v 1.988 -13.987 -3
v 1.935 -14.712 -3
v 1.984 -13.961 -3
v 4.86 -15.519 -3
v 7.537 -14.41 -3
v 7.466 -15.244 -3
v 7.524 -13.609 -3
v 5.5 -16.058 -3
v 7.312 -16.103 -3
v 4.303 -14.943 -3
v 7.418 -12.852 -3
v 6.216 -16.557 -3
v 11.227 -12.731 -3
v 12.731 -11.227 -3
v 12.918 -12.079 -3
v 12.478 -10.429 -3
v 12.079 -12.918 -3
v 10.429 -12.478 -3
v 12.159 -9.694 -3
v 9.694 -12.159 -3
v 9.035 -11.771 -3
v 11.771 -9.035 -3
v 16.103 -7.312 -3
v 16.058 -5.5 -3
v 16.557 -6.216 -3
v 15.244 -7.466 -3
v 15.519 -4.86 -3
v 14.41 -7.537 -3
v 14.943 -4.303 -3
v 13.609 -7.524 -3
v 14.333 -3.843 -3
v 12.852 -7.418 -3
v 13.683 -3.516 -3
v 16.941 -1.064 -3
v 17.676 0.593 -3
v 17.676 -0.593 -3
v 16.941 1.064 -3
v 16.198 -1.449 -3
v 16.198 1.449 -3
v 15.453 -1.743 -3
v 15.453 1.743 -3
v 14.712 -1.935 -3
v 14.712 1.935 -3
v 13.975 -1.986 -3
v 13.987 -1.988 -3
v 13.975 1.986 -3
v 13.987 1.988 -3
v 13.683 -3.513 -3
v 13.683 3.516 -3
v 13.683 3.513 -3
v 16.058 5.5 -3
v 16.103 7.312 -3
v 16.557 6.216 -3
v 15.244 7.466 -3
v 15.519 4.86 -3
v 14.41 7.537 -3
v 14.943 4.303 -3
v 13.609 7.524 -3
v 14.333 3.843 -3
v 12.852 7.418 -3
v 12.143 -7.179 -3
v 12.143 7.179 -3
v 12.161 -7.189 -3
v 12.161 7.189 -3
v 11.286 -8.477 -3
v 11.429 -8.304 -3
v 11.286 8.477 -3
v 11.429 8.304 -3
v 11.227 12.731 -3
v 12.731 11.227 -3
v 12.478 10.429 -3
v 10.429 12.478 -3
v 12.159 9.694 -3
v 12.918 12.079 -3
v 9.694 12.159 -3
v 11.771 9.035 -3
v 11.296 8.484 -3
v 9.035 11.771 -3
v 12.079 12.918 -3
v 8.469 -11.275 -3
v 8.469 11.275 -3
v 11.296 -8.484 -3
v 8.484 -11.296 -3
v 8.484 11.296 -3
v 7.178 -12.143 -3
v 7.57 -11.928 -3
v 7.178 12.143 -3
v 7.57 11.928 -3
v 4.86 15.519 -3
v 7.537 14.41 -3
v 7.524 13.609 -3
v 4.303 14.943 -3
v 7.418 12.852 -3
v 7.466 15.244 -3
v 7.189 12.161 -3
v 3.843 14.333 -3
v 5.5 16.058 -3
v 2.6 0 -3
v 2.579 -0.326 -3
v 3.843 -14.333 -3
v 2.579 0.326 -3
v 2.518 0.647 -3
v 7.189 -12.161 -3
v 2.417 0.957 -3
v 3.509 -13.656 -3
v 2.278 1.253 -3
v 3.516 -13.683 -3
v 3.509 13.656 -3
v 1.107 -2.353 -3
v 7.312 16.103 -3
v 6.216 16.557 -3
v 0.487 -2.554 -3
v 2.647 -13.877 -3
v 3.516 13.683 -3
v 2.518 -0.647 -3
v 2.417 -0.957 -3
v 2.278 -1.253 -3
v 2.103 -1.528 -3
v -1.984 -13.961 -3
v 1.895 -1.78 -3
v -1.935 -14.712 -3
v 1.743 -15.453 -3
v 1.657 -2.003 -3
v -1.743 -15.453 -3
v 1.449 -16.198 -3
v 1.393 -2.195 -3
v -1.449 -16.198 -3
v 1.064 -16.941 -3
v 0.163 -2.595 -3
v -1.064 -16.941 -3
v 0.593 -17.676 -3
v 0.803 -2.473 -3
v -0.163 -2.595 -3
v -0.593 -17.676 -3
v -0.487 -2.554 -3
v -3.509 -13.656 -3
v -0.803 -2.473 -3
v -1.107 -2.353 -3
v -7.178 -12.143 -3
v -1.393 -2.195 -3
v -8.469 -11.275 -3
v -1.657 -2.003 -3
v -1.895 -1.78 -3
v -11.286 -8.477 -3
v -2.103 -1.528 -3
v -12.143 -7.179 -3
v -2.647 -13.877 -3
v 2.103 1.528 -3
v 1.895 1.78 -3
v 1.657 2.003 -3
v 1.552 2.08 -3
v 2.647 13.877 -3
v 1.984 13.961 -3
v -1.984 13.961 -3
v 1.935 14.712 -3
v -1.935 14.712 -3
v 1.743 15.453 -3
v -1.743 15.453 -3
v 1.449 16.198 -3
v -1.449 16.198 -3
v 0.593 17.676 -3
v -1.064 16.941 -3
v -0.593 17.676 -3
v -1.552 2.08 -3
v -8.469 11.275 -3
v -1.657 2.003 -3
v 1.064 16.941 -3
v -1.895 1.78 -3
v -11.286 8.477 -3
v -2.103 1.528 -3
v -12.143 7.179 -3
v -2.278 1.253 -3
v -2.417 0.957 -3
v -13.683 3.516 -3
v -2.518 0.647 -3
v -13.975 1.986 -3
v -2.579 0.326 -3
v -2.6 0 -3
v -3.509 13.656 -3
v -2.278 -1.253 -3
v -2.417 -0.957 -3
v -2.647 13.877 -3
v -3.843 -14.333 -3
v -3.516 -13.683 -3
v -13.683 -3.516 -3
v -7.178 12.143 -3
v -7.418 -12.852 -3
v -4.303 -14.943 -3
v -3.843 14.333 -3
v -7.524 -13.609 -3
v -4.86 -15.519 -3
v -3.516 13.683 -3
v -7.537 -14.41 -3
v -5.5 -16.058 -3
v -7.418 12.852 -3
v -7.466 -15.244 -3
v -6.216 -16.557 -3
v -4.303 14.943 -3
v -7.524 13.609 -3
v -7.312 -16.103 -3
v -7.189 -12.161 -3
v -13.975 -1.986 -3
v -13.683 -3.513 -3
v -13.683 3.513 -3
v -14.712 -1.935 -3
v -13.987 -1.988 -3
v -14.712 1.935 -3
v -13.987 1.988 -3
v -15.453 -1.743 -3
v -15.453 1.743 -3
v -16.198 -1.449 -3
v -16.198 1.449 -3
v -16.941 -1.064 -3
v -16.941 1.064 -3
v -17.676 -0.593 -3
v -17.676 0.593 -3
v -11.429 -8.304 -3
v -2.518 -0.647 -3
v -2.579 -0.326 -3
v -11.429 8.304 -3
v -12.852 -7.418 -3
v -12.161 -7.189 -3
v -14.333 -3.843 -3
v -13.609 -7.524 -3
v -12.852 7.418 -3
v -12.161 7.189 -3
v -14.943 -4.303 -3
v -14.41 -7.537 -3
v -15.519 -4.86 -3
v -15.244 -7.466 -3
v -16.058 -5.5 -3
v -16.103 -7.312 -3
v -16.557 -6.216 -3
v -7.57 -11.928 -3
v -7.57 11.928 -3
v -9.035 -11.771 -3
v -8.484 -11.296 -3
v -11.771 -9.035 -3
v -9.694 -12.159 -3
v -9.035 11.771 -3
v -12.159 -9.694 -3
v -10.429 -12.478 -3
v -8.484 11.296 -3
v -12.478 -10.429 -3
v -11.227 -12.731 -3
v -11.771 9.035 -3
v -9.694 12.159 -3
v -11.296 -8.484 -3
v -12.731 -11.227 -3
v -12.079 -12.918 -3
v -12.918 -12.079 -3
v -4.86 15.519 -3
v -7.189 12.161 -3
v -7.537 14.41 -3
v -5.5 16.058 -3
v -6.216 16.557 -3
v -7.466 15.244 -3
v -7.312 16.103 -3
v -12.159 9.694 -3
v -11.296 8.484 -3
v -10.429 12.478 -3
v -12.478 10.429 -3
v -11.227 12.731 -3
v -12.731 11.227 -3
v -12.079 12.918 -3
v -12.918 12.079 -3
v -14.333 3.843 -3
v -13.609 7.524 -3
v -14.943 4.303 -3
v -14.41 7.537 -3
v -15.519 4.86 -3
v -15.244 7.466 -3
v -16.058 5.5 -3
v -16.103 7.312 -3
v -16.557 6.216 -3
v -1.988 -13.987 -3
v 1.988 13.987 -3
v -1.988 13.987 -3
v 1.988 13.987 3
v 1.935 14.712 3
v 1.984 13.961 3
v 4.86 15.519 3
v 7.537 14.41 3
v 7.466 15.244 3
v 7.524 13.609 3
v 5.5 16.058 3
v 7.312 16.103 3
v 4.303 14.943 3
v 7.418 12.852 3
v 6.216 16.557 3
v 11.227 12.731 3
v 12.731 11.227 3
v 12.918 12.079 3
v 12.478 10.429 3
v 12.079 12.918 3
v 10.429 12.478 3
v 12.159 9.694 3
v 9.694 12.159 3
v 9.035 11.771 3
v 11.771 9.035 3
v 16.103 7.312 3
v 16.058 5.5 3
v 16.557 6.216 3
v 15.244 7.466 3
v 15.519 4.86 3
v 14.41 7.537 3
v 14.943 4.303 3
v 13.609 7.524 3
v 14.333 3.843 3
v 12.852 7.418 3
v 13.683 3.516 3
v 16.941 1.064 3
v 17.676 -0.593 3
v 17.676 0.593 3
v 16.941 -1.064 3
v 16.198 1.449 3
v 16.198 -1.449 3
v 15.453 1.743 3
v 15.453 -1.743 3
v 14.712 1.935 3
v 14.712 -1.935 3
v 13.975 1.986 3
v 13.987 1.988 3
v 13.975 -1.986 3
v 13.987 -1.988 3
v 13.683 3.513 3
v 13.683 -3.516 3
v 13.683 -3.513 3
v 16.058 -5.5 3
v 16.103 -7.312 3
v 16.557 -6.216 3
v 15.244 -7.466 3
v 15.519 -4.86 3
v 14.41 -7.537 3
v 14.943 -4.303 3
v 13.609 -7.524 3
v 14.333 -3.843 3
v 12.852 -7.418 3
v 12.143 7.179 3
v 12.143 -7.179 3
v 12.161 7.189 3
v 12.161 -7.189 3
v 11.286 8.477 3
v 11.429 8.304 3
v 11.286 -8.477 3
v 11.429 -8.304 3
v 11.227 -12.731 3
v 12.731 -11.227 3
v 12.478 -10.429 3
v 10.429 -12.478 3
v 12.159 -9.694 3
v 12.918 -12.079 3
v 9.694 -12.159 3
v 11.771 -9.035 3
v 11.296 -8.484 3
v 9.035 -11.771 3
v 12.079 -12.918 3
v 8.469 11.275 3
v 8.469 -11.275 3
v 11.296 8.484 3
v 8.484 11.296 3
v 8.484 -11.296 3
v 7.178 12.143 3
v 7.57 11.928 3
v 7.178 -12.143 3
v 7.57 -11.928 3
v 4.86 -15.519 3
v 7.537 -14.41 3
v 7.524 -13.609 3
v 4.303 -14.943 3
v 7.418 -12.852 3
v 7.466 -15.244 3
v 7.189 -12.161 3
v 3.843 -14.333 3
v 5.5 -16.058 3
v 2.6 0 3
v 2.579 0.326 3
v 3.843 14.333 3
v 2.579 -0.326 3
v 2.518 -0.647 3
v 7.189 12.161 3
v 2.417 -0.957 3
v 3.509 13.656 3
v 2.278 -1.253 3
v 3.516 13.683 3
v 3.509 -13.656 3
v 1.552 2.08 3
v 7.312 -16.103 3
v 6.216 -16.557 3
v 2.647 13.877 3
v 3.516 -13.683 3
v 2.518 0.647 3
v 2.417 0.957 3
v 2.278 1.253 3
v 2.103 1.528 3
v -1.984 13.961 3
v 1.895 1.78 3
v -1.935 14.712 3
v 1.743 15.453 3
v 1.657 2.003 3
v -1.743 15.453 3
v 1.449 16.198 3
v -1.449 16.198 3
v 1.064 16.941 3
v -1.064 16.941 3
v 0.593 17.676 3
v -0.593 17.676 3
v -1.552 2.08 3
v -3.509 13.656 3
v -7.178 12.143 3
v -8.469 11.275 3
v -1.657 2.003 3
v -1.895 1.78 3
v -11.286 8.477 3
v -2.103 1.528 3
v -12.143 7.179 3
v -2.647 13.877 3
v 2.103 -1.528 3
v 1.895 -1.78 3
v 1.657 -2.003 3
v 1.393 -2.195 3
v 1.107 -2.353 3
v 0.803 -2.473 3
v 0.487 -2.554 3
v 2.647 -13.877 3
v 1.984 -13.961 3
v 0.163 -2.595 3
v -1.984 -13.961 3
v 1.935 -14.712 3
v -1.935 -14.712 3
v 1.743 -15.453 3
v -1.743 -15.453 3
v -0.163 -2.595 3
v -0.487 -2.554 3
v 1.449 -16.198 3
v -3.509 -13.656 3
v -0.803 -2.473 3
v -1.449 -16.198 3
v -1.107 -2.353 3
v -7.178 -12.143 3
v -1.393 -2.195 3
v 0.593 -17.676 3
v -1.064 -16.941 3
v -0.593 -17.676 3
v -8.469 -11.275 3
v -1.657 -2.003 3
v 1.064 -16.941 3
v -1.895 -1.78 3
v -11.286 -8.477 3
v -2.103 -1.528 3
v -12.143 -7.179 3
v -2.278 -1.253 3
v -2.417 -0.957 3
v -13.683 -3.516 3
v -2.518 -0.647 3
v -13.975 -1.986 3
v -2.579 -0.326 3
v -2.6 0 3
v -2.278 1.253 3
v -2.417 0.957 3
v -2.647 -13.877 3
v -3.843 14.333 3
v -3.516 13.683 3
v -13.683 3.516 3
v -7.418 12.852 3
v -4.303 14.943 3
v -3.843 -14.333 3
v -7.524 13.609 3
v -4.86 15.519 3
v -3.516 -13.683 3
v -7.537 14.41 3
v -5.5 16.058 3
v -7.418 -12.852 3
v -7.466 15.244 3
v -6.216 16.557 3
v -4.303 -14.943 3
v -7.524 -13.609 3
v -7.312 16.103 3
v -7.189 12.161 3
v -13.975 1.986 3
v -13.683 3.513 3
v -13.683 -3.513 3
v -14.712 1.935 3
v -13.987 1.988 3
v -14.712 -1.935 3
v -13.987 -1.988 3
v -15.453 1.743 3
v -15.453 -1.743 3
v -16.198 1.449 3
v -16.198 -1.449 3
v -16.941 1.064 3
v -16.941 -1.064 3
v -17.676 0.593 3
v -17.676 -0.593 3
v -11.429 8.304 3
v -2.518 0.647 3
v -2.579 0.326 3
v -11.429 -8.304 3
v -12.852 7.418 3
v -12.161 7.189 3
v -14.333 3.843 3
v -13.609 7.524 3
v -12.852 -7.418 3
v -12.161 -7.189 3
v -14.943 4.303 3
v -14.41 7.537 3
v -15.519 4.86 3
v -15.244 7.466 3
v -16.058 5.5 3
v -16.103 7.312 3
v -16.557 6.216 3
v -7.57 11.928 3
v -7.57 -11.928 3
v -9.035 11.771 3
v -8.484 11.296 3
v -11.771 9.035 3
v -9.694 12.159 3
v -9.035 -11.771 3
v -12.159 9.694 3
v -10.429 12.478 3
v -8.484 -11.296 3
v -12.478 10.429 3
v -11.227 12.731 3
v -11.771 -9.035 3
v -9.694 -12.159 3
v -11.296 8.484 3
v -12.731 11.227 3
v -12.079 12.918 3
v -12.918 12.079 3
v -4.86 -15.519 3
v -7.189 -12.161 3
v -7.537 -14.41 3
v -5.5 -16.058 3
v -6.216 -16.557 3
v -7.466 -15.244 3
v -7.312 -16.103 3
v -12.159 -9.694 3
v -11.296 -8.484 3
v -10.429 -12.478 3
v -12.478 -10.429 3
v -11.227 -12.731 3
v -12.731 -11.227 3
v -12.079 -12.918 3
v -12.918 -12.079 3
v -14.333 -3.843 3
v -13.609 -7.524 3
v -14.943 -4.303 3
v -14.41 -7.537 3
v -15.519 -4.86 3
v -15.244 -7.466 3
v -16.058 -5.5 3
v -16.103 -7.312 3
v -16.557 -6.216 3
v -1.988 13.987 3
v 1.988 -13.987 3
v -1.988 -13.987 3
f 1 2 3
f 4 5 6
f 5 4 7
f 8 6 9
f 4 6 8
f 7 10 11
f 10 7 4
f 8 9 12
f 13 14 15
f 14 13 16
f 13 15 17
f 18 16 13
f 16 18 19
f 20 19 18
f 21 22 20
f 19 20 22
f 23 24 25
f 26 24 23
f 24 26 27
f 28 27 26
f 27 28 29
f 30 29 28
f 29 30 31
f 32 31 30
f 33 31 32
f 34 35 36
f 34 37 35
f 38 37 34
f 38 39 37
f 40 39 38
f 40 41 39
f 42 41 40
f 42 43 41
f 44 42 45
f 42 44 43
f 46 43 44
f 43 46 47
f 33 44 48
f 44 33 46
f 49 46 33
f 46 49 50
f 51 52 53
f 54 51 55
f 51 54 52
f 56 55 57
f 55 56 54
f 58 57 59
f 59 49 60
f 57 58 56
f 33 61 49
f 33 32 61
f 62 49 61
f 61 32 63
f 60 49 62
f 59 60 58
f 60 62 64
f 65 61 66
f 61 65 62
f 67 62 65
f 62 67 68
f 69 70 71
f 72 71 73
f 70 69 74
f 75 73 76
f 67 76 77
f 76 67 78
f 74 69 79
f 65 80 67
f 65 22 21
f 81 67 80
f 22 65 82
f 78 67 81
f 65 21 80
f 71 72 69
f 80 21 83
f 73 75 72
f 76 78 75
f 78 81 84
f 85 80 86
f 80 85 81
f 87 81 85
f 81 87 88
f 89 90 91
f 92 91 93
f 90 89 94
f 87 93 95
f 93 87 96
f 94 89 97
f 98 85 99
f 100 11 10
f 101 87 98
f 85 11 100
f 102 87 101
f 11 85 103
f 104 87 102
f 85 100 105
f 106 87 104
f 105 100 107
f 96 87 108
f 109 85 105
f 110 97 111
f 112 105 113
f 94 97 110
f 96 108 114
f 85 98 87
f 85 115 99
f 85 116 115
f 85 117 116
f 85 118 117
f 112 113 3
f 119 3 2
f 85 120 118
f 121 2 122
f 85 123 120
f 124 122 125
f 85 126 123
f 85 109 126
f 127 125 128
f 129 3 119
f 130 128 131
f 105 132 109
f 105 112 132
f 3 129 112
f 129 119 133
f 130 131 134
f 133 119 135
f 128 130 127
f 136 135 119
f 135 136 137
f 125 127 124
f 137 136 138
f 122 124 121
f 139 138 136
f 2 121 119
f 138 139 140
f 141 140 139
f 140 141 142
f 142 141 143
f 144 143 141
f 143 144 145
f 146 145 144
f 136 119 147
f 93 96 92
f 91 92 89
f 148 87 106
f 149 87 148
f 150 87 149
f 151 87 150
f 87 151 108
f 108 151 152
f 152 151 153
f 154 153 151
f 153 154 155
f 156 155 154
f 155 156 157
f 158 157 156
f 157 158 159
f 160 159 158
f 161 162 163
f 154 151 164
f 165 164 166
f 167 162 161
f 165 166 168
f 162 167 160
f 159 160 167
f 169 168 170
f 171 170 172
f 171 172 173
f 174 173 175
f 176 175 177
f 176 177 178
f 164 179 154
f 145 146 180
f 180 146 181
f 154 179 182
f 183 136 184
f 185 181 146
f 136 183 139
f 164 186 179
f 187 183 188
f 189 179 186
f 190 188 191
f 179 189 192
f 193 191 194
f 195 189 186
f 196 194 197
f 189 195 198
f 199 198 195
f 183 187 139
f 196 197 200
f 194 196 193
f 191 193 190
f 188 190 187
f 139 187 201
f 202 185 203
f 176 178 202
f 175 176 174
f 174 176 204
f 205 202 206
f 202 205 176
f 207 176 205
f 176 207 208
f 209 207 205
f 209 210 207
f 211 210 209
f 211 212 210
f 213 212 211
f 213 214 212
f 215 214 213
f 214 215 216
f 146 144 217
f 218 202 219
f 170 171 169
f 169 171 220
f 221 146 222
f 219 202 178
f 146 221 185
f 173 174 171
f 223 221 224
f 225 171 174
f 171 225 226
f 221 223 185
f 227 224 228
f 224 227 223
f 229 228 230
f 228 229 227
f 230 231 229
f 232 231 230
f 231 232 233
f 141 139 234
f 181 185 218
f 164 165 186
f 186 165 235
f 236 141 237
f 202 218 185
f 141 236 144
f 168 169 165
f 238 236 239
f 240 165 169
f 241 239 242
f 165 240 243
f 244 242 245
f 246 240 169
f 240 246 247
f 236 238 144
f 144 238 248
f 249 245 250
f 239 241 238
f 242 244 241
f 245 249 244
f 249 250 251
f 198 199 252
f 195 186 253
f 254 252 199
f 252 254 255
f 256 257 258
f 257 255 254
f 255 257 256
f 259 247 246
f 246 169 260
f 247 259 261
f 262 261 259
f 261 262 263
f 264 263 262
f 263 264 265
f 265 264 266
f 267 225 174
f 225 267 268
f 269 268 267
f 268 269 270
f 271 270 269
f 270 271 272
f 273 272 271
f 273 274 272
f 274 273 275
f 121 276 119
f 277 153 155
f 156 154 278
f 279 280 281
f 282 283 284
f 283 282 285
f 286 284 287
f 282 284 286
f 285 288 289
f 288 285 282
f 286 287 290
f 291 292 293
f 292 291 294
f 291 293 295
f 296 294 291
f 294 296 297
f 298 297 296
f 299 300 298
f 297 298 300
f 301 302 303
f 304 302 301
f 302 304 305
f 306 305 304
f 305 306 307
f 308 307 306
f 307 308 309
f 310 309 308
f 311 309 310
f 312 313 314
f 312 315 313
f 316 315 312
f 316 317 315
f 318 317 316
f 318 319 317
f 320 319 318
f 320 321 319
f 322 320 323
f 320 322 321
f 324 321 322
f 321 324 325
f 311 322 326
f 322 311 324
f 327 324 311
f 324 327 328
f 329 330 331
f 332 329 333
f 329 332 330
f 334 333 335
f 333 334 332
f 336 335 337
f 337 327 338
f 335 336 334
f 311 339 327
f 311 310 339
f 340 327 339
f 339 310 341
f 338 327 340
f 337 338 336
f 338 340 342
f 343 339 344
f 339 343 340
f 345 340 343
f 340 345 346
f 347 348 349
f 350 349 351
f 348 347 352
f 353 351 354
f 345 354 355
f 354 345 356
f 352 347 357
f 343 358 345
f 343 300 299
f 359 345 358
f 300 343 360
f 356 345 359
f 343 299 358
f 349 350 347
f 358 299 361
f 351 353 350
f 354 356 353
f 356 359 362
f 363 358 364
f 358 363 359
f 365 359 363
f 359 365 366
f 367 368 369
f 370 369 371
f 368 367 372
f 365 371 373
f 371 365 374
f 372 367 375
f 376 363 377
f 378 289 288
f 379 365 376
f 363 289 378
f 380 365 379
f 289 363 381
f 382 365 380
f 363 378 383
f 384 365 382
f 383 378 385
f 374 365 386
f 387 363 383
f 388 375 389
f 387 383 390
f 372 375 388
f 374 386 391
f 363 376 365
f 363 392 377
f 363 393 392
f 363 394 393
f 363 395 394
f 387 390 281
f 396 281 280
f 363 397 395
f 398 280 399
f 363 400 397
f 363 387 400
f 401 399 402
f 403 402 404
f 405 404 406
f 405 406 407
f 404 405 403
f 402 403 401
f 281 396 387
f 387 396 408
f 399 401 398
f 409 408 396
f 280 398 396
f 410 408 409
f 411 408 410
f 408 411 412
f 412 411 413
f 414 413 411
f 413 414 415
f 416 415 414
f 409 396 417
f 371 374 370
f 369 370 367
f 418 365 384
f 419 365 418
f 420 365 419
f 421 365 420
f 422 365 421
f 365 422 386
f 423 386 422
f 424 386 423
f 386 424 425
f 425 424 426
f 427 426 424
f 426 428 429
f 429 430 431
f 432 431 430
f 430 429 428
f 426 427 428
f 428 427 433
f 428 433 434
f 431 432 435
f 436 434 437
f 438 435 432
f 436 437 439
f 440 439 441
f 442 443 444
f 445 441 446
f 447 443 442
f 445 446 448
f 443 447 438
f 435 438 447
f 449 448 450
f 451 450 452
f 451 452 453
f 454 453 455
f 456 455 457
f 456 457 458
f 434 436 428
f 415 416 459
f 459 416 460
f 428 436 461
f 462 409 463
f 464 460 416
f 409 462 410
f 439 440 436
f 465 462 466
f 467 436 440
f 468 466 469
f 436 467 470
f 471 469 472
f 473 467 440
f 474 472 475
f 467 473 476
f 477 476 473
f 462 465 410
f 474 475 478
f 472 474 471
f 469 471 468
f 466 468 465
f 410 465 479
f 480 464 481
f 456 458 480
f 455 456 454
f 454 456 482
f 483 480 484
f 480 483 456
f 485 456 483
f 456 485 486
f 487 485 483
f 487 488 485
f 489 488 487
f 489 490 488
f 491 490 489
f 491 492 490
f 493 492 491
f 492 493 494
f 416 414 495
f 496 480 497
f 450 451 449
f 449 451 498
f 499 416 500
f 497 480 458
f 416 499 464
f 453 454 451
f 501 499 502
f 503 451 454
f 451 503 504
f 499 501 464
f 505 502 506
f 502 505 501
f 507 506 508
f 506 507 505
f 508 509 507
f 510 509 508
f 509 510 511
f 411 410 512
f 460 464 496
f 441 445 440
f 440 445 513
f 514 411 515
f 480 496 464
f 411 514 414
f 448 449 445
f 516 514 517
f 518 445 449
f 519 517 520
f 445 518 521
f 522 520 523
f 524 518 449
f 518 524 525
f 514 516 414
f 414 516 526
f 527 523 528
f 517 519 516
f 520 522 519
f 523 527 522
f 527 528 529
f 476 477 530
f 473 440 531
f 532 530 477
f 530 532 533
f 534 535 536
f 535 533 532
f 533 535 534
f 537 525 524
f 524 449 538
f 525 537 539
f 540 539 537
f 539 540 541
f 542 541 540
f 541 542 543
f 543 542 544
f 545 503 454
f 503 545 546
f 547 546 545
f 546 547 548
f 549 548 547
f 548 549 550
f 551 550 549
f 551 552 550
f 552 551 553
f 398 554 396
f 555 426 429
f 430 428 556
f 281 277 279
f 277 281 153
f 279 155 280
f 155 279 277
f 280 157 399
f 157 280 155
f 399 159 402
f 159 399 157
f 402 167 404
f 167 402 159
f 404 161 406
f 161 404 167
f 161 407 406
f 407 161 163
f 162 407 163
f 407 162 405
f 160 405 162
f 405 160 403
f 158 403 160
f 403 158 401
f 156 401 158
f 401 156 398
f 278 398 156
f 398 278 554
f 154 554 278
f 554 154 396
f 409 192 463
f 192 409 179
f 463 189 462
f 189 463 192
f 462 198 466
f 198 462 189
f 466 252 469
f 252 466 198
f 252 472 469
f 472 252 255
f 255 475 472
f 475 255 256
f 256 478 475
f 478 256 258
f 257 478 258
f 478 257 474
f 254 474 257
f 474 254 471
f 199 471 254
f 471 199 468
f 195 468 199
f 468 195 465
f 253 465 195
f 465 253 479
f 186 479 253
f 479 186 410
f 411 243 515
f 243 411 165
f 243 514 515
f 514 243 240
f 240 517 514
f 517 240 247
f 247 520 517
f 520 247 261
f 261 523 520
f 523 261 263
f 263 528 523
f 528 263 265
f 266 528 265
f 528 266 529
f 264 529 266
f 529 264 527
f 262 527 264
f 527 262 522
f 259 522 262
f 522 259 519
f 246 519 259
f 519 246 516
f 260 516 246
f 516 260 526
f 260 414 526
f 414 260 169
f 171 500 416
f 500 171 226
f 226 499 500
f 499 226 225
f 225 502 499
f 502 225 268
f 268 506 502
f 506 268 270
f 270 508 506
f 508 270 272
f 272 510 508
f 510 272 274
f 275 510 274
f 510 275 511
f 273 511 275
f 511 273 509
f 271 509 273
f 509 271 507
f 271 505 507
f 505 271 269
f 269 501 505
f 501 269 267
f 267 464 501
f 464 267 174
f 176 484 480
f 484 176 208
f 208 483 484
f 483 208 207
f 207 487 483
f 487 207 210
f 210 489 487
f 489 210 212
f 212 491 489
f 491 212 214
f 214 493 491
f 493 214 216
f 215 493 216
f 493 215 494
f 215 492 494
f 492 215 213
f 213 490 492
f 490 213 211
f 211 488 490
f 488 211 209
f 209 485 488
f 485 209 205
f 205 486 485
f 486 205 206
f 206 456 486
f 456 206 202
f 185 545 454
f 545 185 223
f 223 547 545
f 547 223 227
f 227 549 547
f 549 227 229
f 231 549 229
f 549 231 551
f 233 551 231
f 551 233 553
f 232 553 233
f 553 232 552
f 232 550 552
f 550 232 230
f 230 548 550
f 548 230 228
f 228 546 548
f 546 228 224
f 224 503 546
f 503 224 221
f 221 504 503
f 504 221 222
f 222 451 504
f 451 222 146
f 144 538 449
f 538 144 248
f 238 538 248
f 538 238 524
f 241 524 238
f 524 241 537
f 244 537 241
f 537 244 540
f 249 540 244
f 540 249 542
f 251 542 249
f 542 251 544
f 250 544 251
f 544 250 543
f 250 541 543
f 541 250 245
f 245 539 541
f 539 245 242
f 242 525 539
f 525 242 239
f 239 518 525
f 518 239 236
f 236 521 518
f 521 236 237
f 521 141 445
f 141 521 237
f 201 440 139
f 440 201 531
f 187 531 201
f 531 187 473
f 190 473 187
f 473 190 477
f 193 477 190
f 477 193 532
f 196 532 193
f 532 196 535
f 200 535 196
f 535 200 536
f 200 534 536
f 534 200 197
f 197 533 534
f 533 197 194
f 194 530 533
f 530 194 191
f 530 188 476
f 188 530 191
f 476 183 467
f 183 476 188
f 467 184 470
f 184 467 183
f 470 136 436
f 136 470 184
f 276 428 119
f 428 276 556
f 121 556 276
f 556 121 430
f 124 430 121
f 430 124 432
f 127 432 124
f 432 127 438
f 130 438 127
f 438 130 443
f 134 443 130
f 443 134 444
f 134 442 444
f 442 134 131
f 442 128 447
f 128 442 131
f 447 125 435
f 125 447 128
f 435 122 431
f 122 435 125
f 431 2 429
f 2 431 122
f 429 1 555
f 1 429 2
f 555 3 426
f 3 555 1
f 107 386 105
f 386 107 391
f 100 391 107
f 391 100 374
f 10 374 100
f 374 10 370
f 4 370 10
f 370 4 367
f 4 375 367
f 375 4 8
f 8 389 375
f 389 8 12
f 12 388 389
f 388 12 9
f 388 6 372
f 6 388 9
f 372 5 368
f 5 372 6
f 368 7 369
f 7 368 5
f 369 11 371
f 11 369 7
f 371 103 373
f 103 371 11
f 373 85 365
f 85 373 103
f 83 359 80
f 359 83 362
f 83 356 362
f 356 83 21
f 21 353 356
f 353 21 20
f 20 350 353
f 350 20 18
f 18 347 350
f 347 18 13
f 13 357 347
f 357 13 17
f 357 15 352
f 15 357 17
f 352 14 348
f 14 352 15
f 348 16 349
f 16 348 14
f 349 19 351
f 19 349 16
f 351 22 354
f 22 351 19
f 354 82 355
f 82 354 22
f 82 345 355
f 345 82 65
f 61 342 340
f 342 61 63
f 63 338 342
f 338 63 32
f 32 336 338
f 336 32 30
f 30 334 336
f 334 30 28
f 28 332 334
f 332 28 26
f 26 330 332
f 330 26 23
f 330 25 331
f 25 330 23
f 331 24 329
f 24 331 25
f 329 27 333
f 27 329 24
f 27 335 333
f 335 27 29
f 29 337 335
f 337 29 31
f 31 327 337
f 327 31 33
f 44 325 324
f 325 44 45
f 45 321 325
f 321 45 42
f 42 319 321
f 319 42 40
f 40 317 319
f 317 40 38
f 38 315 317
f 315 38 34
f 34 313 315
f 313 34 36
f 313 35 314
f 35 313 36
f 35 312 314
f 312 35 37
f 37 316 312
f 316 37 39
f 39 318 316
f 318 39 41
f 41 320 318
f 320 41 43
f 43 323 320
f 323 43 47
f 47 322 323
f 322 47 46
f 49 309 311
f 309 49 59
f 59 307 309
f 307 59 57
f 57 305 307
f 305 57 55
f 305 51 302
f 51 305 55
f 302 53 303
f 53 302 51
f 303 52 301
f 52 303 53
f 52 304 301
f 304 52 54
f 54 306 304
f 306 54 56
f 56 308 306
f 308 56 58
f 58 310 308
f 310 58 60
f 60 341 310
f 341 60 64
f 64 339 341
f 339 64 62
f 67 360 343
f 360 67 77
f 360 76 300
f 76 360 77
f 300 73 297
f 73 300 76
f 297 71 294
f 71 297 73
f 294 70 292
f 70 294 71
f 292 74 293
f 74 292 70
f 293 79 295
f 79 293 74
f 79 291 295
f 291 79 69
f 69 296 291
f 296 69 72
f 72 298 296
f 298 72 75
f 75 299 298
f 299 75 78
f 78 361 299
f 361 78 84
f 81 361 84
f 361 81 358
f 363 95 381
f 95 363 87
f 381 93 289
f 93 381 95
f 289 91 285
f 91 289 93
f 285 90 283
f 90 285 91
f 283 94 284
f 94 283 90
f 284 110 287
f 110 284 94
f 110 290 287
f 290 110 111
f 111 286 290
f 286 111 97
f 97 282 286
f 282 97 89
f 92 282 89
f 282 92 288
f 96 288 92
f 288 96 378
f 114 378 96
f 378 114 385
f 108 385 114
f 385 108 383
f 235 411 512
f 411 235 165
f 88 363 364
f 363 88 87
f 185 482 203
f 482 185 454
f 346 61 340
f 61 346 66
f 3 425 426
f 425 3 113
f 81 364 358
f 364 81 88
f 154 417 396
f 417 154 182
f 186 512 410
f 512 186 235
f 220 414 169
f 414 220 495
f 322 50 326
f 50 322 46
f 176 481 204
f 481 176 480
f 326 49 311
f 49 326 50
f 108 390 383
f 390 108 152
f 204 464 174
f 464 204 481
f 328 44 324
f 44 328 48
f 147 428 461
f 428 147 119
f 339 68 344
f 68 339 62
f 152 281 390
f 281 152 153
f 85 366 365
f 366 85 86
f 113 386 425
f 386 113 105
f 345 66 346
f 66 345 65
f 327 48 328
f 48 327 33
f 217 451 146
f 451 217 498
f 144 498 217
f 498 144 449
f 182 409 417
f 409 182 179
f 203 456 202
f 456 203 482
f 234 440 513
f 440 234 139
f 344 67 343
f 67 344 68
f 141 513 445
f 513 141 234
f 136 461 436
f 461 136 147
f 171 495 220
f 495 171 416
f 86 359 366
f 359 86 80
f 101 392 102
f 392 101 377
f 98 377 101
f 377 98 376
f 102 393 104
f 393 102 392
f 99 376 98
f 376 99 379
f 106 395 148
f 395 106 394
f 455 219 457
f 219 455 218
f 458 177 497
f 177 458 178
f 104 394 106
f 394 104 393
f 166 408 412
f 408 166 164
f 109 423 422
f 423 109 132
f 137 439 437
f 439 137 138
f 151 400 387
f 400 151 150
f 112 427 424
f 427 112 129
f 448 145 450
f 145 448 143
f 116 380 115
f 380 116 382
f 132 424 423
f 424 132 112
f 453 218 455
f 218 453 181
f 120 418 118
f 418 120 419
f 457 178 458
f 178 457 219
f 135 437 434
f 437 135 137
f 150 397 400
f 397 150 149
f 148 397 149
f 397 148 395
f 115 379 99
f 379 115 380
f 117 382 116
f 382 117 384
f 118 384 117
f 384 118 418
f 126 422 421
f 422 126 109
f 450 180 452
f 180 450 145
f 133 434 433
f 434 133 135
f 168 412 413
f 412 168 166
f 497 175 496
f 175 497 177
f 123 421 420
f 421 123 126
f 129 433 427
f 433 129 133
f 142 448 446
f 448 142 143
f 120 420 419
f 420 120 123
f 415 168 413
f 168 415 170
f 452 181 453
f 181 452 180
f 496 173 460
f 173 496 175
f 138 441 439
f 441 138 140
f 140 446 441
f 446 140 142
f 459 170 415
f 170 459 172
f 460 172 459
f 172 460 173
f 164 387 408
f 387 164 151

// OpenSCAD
//////////////////////////////////////////////////////////////////////////////////////////////
// Public Domain Parametric Involute Spur Gear (and involute helical gear and involute rack)
// version 1.2
// by Leemon Baird, 2011, Leemon@Leemon.com
// http://www.thingiverse.com/thing:5505
// updated, 2015, by CNT.
// http://www.thingiverse.com/thing:900277
//   CNT updates:
//      -adopted NateTG's fix for rack
//      -fixed bad input to example gear
//      -replaced references to 3.14159... with PI
//      -removed use of depricated assign() function.
//      -added hole types
//      -added thingiverse customizer options
//
//
// This file is public domain.  Use it for any purpose, including commercial
// applications.  Attribution would be nice, but is not required.  There is
// no warranty of any kind, including its correctness, usefulness, or safety.
// 
// This is parameterized involute spur (or helical) gear.  It is much simpler and less powerful than
// others on Thingiverse.  But it is public domain.  I implemented it from scratch from the 
// descriptions and equations on Wikipedia and the web, using Mathematica for calculations and testing,
// and I now release it into the public domain.
//
//    http://en.wikipedia.org/wiki/Involute_gear
//    http://en.wikipedia.org/wiki/Gear
//    http://en.wikipedia.org/wiki/List_of_gear_nomenclature
//    http://gtrebaol.free.fr/doc/catia/spur_gear.html
//    http://www.cs.cmu.edu/~rapidproto/mechanisms/chpt7.html
//
// The module gear() gives an involute spur gear, with reasonable defaults for all the parameters.
// Normally, you should just choose the first 4 parameters, and let the rest be default values.
// The module gear() gives a gear in the XY plane, centered on the origin, with one tooth centered on
// the positive Y axis.  The various functions below it take the same parameters, and return various
// measurements for the gear.  The most important is pitch_radius, which tells how far apart to space
// gears that are meshing, and adendum_radius, which gives the size of the region filled by the gear.
// A gear has a "pitch circle", which is an invisible circle that cuts through the middle of each
// tooth (though not the exact center). In order for two gears to mesh, their pitch circles should 
// just touch.  So the distance between their centers should be pitch_radius() for one, plus pitch_radius() 
// for the other, which gives the radii of their pitch circles.
//
// In order for two gears to mesh, they must have the same mm_per_tooth and pressure_angle parameters.  
// mm_per_tooth gives the number of millimeters of arc around the pitch circle covered by one tooth and one
// space between teeth.  The pitch angle controls how flat or bulged the sides of the teeth are.  Common
// values include 14.5 degrees and 20 degrees, and occasionally 25.  Though I've seen 28 recommended for
// plastic gears. Larger numbers bulge out more, giving stronger teeth, so 28 degrees is the default here.
//
// The ratio of number_of_teeth for two meshing gears gives how many times one will make a full 
// revolution when the the other makes one full revolution.  If the two numbers are coprime (i.e. 
// are not both divisible by the same number greater than 1), then every tooth on one gear
// will meet every tooth on the other, for more even wear.  So coprime numbers of teeth are good.
//
// The module rack() gives a rack, which is a bar with teeth.  A rack can mesh with any
// gear that has the same mm_per_tooth and pressure_angle.
//
// Some terminology: 
// The outline of a gear is a smooth circle (the "pitch circle") which has mountains and valleys
// added so it is toothed.  So there is an inner circle (the "root circle") that touches the 
// base of all the teeth, an outer circle that touches the tips of all the teeth,
// and the invisible pitch circle in between them.  There is also a "base circle", which can be smaller than
// all three of the others, which controls the shape of the teeth.  The side of each tooth lies on the path 
// that the end of a string would follow if it were wrapped tightly around the base circle, then slowly unwound.  
// That shape is an "involute", which gives this type of gear its name.
//
//////////////////////////////////////////////////////////////////////////////////////////////
// preview[view:south, tilt:top]
/* [Hidden] */
$fn=50;

/* [Parameters] */
//choose gear type
gear_type = 1; //[1:Gear(or single-helical), 0:Rack, 2:Double-helical]
//choose number of teeth or pitch radius (num teeth = pitch)
num_teeth_or_pitch = 16; 
//helix angle for helical gears.  set to 0 for normal gears.  Note that meshing gears need opposite angles.
helix_angle = 0; //[-45:45]
//Gear thickness
thickness    = 6;
//hole diameter (flat to flat for hexagonal hole)
hole         = 5.2;
hole_type = 1; //[0:round, 1:D shaft, 2: hex bolt head]

//percent of tooth cutoff to allow for clearance between tooth.  A high clearance may cause backlash while a low percentage may cause binding if the gears aren't printed perfectly.
clearance_percentage = 5;

//height of gear rack (for racks only)
height_of_rack       = 10;


/* [Hidden] */
mm_per_tooth = 2*PI; //all meshing gears need the same mm_per_tooth (and the same pressure_angle)

ha = 90-helix_angle;
twst = 360*(thickness/tan(ha))/(2*PI*pitch_radius(mm_per_tooth,num_teeth_or_pitch));

if (gear_type==1) {
  difference () { 
    gear(mm_per_tooth,num_teeth_or_pitch,thickness,0,twst,clearance=mm_per_tooth*clearance_percentage/100);
    if (hole_type == 2) {
      hexagon (hole,2*thickness);
    }  
    if(hole_type == 1) {
      Dshaft(hole,hole/10.0,thickness*2);
    }
    if(hole_type == 0) {
      cylinder(h= thickness*2,r=hole/2,center=true);
    }
  }
}else if (gear_type==2) {
  difference () { 
    union() {
      translate([0,0,thickness/4])
        gear(mm_per_tooth,num_teeth_or_pitch,thickness/2,0,twst,clearance=mm_per_tooth*clearance_percentage/100);
      translate([0,0,-thickness/4]) mirror([0,0,1])
        gear(mm_per_tooth,num_teeth_or_pitch,thickness/2,0,twst,clearance=mm_per_tooth*clearance_percentage/100);
    }
    if (hole_type == 2) {
      hexagon (hole,2*thickness);
    }  
    if(hole_type == 1) {
      Dshaft(hole,hole/10.0,thickness*2);
    }
    if(hole_type == 0) {
      cylinder(h= thickness*2,r=hole/2,center=true);
    }
  }
} else {
  translate([-mm_per_tooth*num_teeth_or_pitch/2,0,0])
    rack(mm_per_tooth,num_teeth_or_pitch,thickness,height_of_rack);
}


// size is the XY plane size, height in Z
module hexagon(size, height) {
  boxWidth = size/1.75;
  for (r = [-60, 0, 60]) rotate([0,0,r]) cube([boxWidth, size, height], true);
}

module Dshaft(diameter,flat,height) {
  difference(){
    cylinder(h= height,r=diameter/2,center=true);
    translate([0,diameter-flat,0]) cube([diameter,diameter,height*2],center=true);
  }
}

//An involute spur gear, with reasonable defaults for all the parameters.
//Normally, you should just choose the first 4 parameters, and let the rest be default values.
//Meshing gears must match in mm_per_tooth, pressure_angle, and twist,
//and be separated by the sum of their pitch radii, which can be found with pitch_radius().
module gear (
  mm_per_tooth    = 3,    //this is the "circular pitch", the circumference of the pitch circle divided by the number of teeth
  number_of_teeth = 11,   //total number of teeth around the entire perimeter
  thickness       = 6,    //thickness of gear in mm
  hole_diameter   = 3,    //diameter of the hole in the center, in mm
  twist           = 0,    //teeth rotate this many degrees from bottom of gear to top.  360 makes the gear a screw with each thread going around once
  teeth_to_hide   = 0,    //number of teeth to delete to make this only a fraction of a circle
  pressure_angle  = 28,   //Controls how straight or bulged the tooth sides are. In degrees.
  clearance       = 0.0,  //gap between top of a tooth on one gear and bottom of valley on a meshing gear (in millimeters)
  backlash        = 0.0   //gap between two meshing teeth, in the direction along the circumference of the pitch circle
) {
  p  = mm_per_tooth * number_of_teeth / PI / 2;  //radius of pitch circle
  c  = p + mm_per_tooth / PI - clearance;        //radius of outer circle
  b  = p*cos(pressure_angle);                    //radius of base circle
  r  = p-(c-p)-clearance;                        //radius of root circle
  t  = mm_per_tooth/2-backlash/2 ;               //tooth thickness at PItch circle
  k  = -iang(b, p) - t/2/p/PI*180; {             //angle to where involute meets base circle on each side of tooth
    difference() {
      union() {
      for (i = [0:number_of_teeth-teeth_to_hide-1] )
        rotate([0,0,i*360/number_of_teeth])
          linear_extrude(height = thickness, center = true, convexity = 30, twist = twist)
            polygon(
              points=[
                [0, -hole_diameter/10],
                polar(r, -181/number_of_teeth),
                polar(r, r<b ? k : -180/number_of_teeth),
                q7(0/5,r,b,c,k, 1),q7(1/5,r,b,c,k, 1),q7(2/5,r,b,c,k, 1),q7(3/5,r,b,c,k, 1),q7(4/5,r,b,c,k, 1),q7(5/5,r,b,c,k, 1),
                q7(5/5,r,b,c,k,-1),q7(4/5,r,b,c,k,-1),q7(3/5,r,b,c,k,-1),q7(2/5,r,b,c,k,-1),q7(1/5,r,b,c,k,-1),q7(0/5,r,b,c,k,-1),
                polar(r, r<b ? -k : 180/number_of_teeth),
                polar(r, 181/number_of_teeth)
              ],
              paths=[[0,1,2,3,4,5,6,7,8,9,10,11,12,13,14,15,16]]
            );
      //shouldn't need this but otherwise openSCAD creates a broken solid.
      cylinder(h=thickness,r=b,center=true);
      }
      cylinder(h=2*thickness+1, r=hole_diameter/2, center=true, $fn=50);
    }
  }
};  
//these 4 functions are used by gear
function polar(r,theta)   = r*[sin(theta), cos(theta)];                            //convert polar to cartesian coordinates
function iang(r1,r2)      = sqrt((r2/r1)*(r2/r1) - 1)/PI*180 - acos(r1/r2); //unwind a string this many degrees to go from radius r1 to radius r2
function q7(f,r,b,r2,t,s) = q6(b,s,t,(1-f)*max(b,r)+f*r2);                         //radius a fraction f up the curved side of the tooth 
function q6(b,s,t,d)      = polar(d,s*(iang(b,d)+t));                              //point at radius d on the involute curve

//a rack, which is a straight line with teeth (the same as a segment from a giant gear with a huge number of teeth).
//The "pitch circle" is a line along the X axis.
module rack (
  mm_per_tooth    = 3,    //this is the "circular pitch", the circumference of the pitch circle divided by the number of teeth
  number_of_teeth = 11,   //total number of teeth along the rack
  thickness       = 6,    //thickness of rack in mm (affects each tooth)
  height          = 120,   //height of rack in mm, from tooth top to far side of rack.
  pressure_angle  = 28,   //Controls how straight or bulged the tooth sides are. In degrees.
  backlash        = 0.0   //gap between two meshing teeth, in the direction along the circumference of the pitch circle
) {
  a = mm_per_tooth / PI; //addendum
    //Note: applied NateTG's fix
  t = a/2*cos(pressure_angle);         //tooth side is tilted so top/bottom corners move this amount
    for (i = [0:number_of_teeth-1] )
        translate([i*mm_per_tooth,0,0])
            linear_extrude(height = thickness, center = true, convexity = 30)
                polygon(
                    points=[
                        [-mm_per_tooth * 3/4,                 a-height],
                        [-mm_per_tooth * 3/4 - backlash,     -a],
                        [-mm_per_tooth * 1/4 + backlash - t, -a],
                        [-mm_per_tooth * 1/4 + backlash + t,  a],
                        [ mm_per_tooth * 1/4 - backlash - t,  a],
                        [ mm_per_tooth * 1/4 - backlash + t, -a],
                        [ mm_per_tooth * 3/4 + backlash,     -a],
                        [ mm_per_tooth * 3/4,                 a-height],
                    ],
                    paths=[[0,1,2,3,4,5,6,7]]
                );
};  

//These 5 functions let the user find the derived dimensions of the gear.
//A gear fits within a circle of radius outer_radius, and two gears should have
//their centers separated by the sum of their pictch_radius.
function circular_pitch  (mm_per_tooth=3) = mm_per_tooth;                     //tooth density expressed as "circular pitch" in millimeters
function diametral_pitch (mm_per_tooth=3) = PI / mm_per_tooth;         //tooth density expressed as "diametral pitch" in teeth per millimeter
function module_value    (mm_per_tooth=3) = mm_per_tooth / PI;                //tooth density expressed as "module" or "modulus" in millimeters
function pitch_radius    (mm_per_tooth=3,number_of_teeth=11) = mm_per_tooth * number_of_teeth / PI / 2;
function outer_radius    (mm_per_tooth=3,number_of_teeth=11,clearance=0.1)    //The gear fits entirely within a cylinder of this radius.
  = mm_per_tooth*(1+number_of_teeth/2)/PI  - clearance;              

//////////////////////////////////////////////////////////////////////////////////////////////
//example gear train.  
//Try it with OpenSCAD View/Animate command with 20 steps and 24 FPS.
//The gears will continue to be rotated to mesh correctly if you change the number of teeth.
